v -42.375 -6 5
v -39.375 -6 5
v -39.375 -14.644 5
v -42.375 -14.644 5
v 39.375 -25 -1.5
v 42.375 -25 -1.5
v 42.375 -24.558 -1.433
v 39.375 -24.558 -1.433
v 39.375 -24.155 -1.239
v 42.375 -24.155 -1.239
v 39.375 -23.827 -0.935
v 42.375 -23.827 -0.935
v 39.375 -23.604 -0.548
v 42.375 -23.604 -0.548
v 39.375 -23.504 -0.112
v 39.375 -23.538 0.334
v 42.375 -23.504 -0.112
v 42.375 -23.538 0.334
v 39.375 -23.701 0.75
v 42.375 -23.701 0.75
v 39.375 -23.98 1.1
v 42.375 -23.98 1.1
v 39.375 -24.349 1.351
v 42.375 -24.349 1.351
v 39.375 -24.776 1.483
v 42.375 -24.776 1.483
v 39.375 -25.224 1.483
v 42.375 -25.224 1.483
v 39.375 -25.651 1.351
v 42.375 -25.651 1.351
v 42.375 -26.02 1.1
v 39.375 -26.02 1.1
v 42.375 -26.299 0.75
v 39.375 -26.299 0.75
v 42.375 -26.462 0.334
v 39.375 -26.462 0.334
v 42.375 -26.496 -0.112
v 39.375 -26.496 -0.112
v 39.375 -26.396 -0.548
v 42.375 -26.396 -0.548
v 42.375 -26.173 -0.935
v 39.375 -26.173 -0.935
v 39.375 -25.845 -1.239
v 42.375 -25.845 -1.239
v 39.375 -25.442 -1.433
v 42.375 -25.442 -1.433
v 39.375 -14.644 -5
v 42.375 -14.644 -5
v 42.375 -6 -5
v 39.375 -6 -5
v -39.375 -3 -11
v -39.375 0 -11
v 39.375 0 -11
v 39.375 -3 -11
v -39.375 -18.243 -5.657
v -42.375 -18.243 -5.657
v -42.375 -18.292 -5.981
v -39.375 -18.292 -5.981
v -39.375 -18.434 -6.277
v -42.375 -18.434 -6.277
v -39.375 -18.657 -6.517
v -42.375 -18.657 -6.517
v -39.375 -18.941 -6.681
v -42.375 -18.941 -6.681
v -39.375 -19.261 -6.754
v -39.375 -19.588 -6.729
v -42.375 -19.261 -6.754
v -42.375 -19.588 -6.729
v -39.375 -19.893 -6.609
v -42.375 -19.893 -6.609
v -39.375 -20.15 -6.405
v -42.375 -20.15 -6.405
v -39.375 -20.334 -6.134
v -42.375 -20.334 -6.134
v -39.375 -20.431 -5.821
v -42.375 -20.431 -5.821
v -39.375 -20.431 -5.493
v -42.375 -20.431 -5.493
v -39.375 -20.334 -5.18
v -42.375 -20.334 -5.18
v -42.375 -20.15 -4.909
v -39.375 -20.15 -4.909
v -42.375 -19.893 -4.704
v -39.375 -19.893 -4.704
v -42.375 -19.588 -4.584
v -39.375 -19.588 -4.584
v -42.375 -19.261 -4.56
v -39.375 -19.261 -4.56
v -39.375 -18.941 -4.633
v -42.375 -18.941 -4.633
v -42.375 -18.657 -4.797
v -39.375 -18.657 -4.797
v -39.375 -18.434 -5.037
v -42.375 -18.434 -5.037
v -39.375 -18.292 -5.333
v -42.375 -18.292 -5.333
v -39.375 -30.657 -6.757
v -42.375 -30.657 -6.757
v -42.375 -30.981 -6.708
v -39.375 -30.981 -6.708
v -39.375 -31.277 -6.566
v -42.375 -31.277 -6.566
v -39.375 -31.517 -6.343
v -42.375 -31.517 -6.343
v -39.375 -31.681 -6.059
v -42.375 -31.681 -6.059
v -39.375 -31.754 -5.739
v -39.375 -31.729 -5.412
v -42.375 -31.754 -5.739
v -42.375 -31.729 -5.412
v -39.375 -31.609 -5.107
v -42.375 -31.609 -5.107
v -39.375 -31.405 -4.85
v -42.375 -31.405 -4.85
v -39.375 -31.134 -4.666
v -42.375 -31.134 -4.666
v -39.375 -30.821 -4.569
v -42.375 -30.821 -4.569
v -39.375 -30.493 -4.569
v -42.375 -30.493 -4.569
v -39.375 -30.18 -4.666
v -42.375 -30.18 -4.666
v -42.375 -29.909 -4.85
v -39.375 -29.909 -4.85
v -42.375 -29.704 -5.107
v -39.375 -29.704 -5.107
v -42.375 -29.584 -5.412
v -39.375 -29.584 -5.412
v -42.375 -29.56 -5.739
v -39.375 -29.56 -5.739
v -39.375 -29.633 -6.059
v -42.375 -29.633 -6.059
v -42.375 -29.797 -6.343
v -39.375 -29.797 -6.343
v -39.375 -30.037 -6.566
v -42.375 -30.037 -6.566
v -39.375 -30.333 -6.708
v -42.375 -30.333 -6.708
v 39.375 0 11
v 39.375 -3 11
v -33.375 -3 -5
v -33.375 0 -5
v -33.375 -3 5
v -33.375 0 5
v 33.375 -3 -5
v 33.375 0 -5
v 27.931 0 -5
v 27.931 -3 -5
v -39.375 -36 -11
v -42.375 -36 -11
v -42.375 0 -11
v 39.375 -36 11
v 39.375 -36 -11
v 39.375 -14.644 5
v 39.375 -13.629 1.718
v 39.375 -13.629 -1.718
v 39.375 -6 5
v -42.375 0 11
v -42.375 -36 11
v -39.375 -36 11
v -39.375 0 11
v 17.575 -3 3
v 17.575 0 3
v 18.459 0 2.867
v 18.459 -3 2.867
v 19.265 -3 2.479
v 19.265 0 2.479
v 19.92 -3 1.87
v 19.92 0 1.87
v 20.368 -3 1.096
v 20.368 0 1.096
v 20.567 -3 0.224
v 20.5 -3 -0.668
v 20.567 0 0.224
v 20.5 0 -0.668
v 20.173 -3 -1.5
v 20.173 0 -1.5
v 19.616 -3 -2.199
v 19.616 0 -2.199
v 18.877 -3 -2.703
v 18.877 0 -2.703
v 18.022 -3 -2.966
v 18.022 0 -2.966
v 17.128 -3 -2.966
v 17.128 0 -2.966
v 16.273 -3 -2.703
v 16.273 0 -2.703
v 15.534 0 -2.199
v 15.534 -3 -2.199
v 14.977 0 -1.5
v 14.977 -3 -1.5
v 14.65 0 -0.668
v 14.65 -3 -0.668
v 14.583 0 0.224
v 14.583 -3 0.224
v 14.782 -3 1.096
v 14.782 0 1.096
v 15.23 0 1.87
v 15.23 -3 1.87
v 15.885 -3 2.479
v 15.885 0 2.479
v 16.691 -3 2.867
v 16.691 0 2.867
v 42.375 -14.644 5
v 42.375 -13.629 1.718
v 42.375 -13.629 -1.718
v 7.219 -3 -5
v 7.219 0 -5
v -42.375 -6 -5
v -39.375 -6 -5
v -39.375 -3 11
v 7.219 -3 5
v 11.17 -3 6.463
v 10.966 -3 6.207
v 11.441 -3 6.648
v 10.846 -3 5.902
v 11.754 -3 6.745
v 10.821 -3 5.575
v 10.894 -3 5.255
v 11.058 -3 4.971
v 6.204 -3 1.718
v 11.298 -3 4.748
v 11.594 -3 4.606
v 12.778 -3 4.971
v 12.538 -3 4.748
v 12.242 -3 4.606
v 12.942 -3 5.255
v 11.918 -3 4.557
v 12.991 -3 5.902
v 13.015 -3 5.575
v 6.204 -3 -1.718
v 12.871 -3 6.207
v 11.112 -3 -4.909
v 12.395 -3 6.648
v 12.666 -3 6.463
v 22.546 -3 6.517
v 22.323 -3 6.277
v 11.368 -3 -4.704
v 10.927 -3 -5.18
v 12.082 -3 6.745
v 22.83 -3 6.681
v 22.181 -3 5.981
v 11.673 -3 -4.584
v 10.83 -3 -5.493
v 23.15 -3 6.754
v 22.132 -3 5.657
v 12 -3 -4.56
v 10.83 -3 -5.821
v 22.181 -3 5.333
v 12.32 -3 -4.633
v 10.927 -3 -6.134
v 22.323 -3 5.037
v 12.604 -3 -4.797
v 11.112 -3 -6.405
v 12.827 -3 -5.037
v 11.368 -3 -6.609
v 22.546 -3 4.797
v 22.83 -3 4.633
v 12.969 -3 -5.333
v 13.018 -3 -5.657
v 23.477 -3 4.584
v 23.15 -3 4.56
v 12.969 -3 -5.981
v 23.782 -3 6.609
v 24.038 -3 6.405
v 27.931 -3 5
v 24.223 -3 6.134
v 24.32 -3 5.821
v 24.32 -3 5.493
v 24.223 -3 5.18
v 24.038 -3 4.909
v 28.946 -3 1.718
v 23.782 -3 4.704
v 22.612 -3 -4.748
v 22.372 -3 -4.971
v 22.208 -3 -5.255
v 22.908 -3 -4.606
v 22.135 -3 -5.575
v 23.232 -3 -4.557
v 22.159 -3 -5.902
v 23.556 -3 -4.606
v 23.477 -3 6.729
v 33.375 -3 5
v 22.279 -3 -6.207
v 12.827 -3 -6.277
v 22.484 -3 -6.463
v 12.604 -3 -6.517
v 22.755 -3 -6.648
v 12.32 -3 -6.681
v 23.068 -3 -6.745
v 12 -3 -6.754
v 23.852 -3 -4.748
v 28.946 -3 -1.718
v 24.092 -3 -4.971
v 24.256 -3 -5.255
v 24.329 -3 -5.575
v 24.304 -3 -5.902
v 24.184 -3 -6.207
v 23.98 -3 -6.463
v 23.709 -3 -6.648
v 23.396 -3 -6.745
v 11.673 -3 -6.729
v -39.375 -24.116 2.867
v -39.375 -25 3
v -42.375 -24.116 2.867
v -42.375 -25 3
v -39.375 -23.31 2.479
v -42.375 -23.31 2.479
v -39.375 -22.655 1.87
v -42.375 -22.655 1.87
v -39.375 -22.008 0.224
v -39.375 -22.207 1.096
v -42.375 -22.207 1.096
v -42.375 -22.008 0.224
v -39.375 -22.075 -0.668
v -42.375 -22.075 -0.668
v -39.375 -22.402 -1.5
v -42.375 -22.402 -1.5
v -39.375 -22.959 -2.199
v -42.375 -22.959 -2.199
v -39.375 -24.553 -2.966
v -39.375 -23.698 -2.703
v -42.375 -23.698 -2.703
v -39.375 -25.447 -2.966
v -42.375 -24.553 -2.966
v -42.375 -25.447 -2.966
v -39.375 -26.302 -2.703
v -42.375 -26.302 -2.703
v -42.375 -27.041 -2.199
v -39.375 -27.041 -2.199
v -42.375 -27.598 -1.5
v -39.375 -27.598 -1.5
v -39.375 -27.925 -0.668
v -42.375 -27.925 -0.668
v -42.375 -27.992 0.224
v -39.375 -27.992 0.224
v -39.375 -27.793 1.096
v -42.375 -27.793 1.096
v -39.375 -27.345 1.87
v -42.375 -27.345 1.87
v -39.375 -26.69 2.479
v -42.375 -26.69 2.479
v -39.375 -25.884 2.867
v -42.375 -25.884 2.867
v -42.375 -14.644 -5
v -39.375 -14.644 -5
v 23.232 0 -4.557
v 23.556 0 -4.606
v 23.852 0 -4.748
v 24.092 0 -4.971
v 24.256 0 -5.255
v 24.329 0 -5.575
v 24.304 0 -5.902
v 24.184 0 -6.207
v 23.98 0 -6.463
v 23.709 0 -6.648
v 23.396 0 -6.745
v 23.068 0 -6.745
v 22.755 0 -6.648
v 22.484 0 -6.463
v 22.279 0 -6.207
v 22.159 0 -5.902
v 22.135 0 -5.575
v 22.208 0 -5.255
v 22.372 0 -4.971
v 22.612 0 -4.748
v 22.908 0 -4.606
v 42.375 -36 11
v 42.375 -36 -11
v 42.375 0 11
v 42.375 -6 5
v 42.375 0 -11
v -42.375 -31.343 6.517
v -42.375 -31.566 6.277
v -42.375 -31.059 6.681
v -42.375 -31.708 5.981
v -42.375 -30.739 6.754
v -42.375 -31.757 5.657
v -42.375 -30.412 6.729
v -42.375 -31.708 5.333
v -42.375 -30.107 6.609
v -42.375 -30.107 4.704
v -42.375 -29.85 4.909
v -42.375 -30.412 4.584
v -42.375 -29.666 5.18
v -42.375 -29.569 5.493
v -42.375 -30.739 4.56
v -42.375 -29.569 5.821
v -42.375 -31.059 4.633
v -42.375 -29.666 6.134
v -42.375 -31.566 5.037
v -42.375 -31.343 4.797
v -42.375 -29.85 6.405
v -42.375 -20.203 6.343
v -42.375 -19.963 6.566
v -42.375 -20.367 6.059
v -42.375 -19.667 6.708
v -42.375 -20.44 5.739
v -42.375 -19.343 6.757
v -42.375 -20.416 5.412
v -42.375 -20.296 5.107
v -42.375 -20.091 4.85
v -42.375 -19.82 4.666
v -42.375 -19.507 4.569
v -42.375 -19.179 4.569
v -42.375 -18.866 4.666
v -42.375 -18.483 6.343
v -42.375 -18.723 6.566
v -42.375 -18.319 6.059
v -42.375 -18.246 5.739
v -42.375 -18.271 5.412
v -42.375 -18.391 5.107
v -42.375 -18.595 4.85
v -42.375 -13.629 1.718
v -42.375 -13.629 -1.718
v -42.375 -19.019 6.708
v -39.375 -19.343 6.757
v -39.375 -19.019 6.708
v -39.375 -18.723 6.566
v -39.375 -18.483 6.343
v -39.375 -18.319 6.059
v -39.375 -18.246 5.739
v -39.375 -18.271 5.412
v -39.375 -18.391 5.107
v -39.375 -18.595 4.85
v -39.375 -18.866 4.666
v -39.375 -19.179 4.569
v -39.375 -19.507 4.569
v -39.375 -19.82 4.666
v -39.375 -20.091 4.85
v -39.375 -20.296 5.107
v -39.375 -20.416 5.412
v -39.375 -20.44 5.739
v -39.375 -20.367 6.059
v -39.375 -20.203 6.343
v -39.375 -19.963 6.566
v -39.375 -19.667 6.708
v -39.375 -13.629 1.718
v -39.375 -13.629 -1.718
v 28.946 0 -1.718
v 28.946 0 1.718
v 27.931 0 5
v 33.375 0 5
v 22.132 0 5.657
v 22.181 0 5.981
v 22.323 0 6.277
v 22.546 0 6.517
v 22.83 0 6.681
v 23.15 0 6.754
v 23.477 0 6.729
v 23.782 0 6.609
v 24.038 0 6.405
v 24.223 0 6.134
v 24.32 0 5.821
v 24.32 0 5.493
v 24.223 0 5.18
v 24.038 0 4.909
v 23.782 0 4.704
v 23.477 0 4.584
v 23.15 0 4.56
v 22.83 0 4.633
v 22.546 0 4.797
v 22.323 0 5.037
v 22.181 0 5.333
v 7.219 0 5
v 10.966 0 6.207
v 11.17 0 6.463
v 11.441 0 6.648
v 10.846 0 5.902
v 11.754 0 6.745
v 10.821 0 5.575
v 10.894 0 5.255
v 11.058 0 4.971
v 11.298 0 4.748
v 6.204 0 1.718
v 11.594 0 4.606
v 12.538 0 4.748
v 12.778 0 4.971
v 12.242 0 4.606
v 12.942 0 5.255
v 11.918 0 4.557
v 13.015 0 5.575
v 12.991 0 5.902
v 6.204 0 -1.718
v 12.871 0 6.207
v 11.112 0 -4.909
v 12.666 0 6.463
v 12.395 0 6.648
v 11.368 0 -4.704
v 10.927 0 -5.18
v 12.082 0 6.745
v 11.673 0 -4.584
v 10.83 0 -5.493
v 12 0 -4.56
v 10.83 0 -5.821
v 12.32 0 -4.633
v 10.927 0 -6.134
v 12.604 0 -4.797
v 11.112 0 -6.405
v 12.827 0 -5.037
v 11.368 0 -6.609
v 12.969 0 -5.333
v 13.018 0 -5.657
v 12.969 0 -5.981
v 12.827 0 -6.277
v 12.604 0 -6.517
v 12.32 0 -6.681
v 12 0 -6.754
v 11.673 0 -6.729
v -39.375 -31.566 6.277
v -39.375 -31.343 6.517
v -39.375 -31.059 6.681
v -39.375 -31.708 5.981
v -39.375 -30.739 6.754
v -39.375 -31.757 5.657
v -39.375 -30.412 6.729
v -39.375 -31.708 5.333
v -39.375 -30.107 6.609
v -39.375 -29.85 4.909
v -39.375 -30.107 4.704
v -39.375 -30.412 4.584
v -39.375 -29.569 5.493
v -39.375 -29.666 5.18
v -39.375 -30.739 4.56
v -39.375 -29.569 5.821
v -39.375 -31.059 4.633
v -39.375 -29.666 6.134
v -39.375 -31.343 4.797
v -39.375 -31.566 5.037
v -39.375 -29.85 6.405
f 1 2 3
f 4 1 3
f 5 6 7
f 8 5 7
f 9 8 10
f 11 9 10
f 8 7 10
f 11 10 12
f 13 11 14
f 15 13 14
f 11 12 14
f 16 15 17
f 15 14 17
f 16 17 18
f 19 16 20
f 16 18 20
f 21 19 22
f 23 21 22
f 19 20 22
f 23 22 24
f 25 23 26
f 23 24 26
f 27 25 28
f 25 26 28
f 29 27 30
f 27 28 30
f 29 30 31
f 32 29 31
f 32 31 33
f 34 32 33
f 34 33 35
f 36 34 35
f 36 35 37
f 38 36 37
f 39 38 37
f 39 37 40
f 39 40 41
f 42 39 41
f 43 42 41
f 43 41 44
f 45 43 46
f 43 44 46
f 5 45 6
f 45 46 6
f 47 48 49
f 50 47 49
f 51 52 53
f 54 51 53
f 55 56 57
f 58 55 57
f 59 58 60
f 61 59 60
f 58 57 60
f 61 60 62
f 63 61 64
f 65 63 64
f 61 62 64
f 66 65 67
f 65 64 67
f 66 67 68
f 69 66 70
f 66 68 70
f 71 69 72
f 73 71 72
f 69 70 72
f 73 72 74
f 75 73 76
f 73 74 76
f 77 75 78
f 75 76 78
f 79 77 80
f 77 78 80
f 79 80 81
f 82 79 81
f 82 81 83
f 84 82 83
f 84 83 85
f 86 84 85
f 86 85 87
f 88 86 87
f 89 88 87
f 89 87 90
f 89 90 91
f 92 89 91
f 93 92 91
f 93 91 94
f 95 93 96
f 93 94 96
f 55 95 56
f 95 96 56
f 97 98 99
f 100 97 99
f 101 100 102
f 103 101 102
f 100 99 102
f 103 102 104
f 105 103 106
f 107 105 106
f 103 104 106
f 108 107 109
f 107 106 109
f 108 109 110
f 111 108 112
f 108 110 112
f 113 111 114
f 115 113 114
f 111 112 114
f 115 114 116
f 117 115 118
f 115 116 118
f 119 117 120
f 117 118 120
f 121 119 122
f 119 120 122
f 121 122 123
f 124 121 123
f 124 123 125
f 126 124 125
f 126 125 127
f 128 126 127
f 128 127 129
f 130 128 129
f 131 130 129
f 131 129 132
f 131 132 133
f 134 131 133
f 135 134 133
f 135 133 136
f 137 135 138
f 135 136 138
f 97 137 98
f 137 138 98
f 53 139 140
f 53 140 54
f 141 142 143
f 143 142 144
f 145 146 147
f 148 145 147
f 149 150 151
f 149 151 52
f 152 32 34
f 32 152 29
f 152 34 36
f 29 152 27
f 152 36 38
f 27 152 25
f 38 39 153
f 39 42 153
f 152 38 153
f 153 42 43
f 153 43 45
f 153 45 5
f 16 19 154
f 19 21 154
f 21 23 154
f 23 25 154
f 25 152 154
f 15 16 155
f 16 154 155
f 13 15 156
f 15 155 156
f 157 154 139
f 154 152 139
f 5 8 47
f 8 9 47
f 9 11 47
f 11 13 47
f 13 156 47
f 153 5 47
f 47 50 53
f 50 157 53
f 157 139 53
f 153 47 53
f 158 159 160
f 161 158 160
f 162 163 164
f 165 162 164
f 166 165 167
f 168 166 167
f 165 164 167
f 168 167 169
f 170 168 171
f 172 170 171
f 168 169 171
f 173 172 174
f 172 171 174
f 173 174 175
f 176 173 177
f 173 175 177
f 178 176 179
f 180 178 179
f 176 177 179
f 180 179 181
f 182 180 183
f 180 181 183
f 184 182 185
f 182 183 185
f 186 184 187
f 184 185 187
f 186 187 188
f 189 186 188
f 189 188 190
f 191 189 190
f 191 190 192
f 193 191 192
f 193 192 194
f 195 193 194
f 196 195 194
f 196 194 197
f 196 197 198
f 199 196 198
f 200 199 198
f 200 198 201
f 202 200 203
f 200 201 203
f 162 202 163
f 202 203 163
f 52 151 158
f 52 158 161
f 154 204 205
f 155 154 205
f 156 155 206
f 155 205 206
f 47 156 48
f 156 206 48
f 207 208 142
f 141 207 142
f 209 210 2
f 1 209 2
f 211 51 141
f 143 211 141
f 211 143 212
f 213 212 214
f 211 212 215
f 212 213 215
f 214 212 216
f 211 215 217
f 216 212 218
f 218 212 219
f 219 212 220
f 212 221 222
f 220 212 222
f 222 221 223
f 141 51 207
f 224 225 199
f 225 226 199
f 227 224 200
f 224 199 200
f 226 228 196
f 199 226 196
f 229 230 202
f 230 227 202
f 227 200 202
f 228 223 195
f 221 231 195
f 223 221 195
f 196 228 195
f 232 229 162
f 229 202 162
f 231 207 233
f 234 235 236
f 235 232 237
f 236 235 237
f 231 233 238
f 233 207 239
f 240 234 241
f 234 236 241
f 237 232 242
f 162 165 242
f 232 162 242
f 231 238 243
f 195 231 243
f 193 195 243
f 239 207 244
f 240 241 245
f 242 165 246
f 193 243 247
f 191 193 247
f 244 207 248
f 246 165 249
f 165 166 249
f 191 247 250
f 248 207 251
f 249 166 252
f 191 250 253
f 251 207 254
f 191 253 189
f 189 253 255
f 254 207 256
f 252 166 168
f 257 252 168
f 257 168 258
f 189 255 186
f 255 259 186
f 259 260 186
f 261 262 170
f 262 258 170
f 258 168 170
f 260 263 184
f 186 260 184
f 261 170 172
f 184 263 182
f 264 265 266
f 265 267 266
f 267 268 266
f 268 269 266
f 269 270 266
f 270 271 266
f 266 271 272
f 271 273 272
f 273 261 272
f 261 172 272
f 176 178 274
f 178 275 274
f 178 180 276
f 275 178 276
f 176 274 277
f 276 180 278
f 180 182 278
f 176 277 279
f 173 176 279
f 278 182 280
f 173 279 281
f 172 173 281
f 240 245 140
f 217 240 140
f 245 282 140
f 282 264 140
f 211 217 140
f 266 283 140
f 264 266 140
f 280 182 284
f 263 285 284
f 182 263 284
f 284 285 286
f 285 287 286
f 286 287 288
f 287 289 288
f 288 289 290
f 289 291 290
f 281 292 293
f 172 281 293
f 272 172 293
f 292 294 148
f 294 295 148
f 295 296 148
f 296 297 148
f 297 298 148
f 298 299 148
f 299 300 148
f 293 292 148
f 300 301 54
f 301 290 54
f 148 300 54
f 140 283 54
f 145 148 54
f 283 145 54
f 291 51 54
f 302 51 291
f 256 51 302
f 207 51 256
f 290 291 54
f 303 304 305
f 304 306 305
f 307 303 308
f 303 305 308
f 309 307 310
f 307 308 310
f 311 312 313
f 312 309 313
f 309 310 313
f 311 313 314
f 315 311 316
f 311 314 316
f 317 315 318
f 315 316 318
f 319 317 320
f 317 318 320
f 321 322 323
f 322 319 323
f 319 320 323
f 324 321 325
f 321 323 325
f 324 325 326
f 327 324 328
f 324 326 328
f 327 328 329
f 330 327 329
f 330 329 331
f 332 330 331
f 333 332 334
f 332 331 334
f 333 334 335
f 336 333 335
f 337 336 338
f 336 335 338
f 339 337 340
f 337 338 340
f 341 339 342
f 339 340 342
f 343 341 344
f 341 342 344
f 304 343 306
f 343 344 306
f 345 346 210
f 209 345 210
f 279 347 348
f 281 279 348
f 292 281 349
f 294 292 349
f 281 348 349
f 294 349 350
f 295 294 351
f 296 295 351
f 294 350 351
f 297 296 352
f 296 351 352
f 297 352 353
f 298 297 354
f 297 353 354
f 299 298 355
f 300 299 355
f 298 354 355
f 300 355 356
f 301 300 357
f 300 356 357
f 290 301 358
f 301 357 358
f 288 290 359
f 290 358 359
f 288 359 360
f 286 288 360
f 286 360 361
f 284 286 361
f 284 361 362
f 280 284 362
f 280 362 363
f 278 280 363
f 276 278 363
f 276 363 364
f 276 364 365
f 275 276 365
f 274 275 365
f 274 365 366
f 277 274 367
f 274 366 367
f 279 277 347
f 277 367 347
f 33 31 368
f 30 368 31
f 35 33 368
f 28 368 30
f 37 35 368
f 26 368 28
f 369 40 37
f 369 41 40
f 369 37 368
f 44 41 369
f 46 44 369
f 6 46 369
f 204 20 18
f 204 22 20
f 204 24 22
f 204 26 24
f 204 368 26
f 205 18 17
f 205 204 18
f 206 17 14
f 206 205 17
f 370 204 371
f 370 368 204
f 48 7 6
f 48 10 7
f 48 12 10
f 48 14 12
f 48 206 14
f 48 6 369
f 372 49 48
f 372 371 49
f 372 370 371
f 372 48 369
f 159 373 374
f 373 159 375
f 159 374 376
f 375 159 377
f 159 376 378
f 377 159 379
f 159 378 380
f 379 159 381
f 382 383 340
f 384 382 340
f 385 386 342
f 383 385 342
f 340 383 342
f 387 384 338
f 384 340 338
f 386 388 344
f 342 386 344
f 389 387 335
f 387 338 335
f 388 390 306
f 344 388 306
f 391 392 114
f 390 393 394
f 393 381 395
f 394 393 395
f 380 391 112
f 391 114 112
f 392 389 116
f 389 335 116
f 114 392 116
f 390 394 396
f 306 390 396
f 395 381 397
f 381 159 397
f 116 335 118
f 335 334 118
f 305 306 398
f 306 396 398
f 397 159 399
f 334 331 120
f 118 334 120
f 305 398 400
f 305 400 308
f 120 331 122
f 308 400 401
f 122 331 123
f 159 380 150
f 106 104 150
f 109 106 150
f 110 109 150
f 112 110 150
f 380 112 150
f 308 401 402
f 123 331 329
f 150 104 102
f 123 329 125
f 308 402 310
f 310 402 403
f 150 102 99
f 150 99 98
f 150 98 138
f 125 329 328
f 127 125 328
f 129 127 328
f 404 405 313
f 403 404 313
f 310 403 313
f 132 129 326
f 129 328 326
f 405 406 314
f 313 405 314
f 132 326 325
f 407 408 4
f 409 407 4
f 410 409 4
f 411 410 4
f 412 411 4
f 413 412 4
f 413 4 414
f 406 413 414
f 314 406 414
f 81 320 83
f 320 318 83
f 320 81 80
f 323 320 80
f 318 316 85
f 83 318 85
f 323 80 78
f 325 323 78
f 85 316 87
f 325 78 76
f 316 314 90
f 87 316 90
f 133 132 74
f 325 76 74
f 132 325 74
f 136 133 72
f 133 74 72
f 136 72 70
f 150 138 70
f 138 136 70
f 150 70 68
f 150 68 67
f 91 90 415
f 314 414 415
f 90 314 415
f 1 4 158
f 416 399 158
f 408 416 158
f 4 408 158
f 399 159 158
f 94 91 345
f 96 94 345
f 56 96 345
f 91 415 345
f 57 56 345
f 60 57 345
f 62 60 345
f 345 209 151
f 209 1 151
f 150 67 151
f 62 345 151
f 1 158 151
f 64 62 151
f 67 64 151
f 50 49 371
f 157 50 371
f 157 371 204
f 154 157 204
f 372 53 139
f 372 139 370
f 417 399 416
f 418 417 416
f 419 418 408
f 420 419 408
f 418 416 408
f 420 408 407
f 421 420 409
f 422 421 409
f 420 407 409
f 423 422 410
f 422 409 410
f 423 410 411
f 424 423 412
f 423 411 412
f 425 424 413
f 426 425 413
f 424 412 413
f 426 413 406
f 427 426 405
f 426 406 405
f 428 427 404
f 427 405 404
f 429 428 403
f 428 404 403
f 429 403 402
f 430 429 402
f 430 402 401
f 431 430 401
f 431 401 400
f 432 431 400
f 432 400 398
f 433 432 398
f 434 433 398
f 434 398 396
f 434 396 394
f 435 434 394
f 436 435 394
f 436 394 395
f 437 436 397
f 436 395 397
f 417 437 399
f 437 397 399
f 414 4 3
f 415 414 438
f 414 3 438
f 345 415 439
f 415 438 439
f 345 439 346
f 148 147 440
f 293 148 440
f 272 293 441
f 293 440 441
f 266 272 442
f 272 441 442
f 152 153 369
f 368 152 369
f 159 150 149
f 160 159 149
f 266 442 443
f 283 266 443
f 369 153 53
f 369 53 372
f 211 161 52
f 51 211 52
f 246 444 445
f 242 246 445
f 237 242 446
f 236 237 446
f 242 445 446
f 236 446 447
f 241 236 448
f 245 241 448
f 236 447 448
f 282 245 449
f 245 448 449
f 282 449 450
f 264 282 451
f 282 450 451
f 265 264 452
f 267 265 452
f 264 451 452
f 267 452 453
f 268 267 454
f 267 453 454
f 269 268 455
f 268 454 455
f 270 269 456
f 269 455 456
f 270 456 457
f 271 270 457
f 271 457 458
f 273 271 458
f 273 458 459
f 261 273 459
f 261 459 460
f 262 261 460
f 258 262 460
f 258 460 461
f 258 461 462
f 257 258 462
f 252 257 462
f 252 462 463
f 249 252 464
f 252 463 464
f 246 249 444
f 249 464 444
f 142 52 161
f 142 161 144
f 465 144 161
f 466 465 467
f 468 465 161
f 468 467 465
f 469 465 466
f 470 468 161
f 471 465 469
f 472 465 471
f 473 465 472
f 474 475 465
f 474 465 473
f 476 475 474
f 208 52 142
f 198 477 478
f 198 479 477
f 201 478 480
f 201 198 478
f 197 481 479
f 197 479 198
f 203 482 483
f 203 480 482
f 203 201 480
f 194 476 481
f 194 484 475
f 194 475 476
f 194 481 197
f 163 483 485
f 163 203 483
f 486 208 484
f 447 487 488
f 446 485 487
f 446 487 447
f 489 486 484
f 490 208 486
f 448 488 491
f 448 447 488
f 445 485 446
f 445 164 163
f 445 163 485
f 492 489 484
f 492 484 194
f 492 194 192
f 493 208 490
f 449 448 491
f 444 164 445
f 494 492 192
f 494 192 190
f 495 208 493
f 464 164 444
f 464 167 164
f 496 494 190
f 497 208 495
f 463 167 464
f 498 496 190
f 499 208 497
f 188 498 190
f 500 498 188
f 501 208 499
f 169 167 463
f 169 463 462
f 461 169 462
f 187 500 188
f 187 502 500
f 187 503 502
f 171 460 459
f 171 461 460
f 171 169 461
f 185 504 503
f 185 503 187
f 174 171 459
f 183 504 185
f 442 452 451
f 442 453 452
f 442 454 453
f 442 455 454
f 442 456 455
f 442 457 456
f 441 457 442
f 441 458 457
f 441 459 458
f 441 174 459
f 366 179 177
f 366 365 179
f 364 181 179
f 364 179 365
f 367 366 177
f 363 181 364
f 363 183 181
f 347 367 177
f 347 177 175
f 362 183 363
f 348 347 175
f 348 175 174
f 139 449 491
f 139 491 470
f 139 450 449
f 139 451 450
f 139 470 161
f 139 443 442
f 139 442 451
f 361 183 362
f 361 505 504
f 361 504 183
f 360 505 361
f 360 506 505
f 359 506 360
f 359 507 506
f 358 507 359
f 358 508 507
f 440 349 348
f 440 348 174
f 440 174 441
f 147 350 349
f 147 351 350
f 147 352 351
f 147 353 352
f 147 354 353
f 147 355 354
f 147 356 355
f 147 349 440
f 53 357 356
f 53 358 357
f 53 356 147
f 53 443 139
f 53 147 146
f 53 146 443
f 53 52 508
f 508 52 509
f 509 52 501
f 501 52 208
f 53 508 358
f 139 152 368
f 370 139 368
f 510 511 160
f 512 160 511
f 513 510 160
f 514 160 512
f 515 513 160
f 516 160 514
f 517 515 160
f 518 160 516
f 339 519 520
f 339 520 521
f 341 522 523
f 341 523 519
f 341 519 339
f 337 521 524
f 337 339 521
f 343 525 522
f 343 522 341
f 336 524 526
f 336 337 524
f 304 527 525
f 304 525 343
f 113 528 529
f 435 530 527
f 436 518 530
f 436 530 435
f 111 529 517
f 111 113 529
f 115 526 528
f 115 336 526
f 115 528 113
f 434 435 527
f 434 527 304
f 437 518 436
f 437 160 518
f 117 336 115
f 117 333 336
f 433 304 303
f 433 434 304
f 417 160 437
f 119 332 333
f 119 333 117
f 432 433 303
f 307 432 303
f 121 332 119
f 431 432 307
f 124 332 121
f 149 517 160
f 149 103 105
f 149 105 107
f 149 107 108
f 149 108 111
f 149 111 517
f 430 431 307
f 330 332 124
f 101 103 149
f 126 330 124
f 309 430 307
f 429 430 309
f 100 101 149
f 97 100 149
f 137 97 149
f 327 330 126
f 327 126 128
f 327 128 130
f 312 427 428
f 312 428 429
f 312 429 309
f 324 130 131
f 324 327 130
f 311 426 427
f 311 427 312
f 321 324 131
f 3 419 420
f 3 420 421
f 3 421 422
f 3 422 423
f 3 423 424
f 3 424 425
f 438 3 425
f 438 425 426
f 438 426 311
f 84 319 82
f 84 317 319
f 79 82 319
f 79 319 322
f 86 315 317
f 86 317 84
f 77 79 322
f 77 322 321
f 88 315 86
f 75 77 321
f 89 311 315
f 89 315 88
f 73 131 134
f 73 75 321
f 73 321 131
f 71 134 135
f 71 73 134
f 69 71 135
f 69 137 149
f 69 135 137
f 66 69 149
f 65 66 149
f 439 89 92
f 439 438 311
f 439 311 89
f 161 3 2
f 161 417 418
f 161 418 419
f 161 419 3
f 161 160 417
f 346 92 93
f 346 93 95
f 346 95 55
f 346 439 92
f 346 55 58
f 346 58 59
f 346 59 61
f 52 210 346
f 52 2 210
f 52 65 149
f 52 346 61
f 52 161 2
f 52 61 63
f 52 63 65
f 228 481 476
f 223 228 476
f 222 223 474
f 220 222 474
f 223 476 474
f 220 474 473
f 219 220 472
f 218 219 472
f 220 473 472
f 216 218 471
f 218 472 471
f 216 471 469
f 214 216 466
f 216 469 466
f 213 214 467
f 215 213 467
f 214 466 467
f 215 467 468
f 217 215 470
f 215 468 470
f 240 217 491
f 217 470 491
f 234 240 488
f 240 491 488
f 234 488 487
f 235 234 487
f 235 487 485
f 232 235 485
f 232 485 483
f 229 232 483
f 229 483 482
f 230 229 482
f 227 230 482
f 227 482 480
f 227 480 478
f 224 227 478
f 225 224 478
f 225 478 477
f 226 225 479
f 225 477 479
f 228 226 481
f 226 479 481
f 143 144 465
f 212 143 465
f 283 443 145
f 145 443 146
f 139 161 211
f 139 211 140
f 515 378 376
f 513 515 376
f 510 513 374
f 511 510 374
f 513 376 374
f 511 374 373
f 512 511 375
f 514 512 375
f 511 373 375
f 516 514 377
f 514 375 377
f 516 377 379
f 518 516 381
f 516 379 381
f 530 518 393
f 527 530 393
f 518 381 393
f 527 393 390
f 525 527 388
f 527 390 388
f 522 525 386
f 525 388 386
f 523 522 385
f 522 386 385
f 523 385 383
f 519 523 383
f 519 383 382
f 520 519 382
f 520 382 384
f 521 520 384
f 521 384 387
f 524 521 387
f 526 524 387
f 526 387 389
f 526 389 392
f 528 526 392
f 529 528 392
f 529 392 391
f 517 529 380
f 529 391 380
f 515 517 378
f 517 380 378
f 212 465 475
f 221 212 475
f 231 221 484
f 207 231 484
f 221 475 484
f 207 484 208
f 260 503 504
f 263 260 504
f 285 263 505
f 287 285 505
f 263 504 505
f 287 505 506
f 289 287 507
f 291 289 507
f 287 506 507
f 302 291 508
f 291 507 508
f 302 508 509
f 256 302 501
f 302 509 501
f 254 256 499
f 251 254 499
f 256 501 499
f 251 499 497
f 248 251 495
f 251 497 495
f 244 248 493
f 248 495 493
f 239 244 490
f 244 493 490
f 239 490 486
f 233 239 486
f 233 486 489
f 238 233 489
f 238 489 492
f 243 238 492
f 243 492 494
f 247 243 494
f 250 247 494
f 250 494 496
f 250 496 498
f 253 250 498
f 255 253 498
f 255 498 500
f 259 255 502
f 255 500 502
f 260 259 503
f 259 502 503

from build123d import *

# Parameters (mm, degrees)
SKETCH1_W             = 78.75
SKETCH1_H             = 22
SKETCH1_R             = 3
BOSS_EXTRUDE1_DEPTH   = 3
SKETCH1_3_W           = 3
SKETCH1_3_H           = 22
BOSS_EXTRUDE2_DEPTH   = 36
BOSS_EXTRUDE2_2_DEPTH = 36
SKETCH2_R             = 3
SKETCH2_R_2           = 1.1
CUT_EXTRUDE1_DEPTH    = 3
SKETCH3_R             = 1.5
CUT_EXTRUDE2_DEPTH    = 3
CIRPATTERN1_COUNT     = 4
SKETCH4_R             = 1.1
CUT_EXTRUDE3_DEPTH    = 3
CIRPATTERN2_COUNT     = 4
CUT_EXTRUDE4_START    = -84.75
CUT_EXTRUDE4_DEPTH    = 84.75


with BuildPart() as part:
    # Sketch1 → Boss-Extrude1 (new body)
    with BuildSketch(Plane(origin=(0, 0, 0), x_dir=(1, 0, 0), z_dir=(0, 1, 0))):
        Rectangle(SKETCH1_W, SKETCH1_H)
        with Locations(Location((17.575, 0, 0), (0, 0, 270))):
            Circle(SKETCH1_R, mode=Mode.SUBTRACT)
        with BuildLine():
            Line((33.375, 5), (27.931157589, 5))
            ThreePointArc((27.931157589, 5), (29.075, 0), (27.931157589, -5))
            Line((27.931157589, -5), (33.375, -5))
            Line((33.375, -5), (33.375, 5))
        make_face(mode=Mode.SUBTRACT)
        with BuildLine():
            Line((-33.375, 5), (-33.375, -5))
            Line((-33.375, -5), (7.218842411, -5))
            ThreePointArc((7.218842411, -5), (6.075, 0), (7.218842411, 5))
            Line((7.218842411, 5), (-33.375, 5))
        make_face(mode=Mode.SUBTRACT)
    extrude(amount=-BOSS_EXTRUDE1_DEPTH)

    # Sketch4 → Cut-Extrude3 (cut)
    with BuildSketch(Plane(origin=(0, 0, 0), x_dir=(1, 0, 0), z_dir=(0, 1, 0))):
        with Locations(Location((23.231854249, 5.656854249, 0), (0, 0, 270))):
            Circle(SKETCH4_R)
    cut_extrude3 = extrude(amount=-CUT_EXTRUDE3_DEPTH, mode=Mode.SUBTRACT)

    # CirPattern2: Cut-Extrude3 ×4 about axis
    cirpattern2_axis = Axis((17.575, 0, 0), (0, 1, 0))
    for i in range(1, CIRPATTERN2_COUNT):
        add(cut_extrude3.rotate(cirpattern2_axis, i * 360 / CIRPATTERN2_COUNT), mode=Mode.SUBTRACT)


with BuildPart() as body_2:
    # Sketch1<3> → Boss-Extrude2 (new body)
    with BuildSketch(Plane(origin=(0, 0, 0), x_dir=(1, 0, 0), z_dir=(0, 1, 0))):
        with Locations((-40.875, 0)):
            Rectangle(SKETCH1_3_W, SKETCH1_3_H)
    extrude(amount=-BOSS_EXTRUDE2_DEPTH)

    # Sketch2 → Cut-Extrude1 (cut)
    with BuildSketch(Plane.ZY.offset(42.375)):
        with Locations((0, -25)):
            Circle(SKETCH2_R)
        with Locations((5.656854249, -19.343145751)):
            Circle(SKETCH2_R_2)
    cut_extrude1 = extrude(amount=-CUT_EXTRUDE1_DEPTH, mode=Mode.SUBTRACT)

    # CirPattern1: Cut-Extrude1 ×4 about axis
    cirpattern1_axis = Axis((0, -25, 0), (1, 0, 0))
    for i in range(1, CIRPATTERN1_COUNT):
        add(cut_extrude1.rotate(cirpattern1_axis, i * 360 / CIRPATTERN1_COUNT), mode=Mode.SUBTRACT)


with BuildPart() as body_3:
    # Sketch1<3> → Boss-Extrude2 2 (new body)
    with BuildSketch(Plane(origin=(0, 0, 0), x_dir=(1, 0, 0), z_dir=(0, 1, 0))):
        with Locations((40.875, 0)):
            Rectangle(SKETCH1_3_W, SKETCH1_3_H)
    extrude(amount=-BOSS_EXTRUDE2_2_DEPTH)

    # Sketch3 → Cut-Extrude2 (cut)
    with BuildSketch(Plane(origin=(42.375, 0, 0), x_dir=(0, 0, -1), z_dir=(1, 0, 0))):
        with Locations((0, -25)):
            Circle(SKETCH3_R)
    extrude(amount=-CUT_EXTRUDE2_DEPTH, mode=Mode.SUBTRACT)


with BuildPart() as cut_extrude4_tool:
    # Sketch5 → Cut-Extrude4 (new body)
    with BuildSketch(Plane.ZY.offset(42.375).offset(CUT_EXTRUDE4_START)):
        with BuildLine():
            Line((-5, -14.643842411), (-5, -6))
            Line((-5, -6), (5, -6))
            Line((5, -6), (5, -14.643842411))
            ThreePointArc((5, -14.643842411), (0, -13.5), (-5, -14.643842411))
        make_face()
    extrude(amount=CUT_EXTRUDE4_DEPTH)


with BuildPart() as body_2_1:
    add(body_2.part)

    # Cut-Extrude4: cut by cut_extrude4_tool
    add(cut_extrude4_tool.part, mode=Mode.SUBTRACT)


with BuildPart() as body_3_1:
    add(body_3.part)

    # Cut-Extrude4: cut by cut_extrude4_tool
    add(cut_extrude4_tool.part, mode=Mode.SUBTRACT)


solid = Compound([part.part, body_2_1.part, body_3_1.part])
